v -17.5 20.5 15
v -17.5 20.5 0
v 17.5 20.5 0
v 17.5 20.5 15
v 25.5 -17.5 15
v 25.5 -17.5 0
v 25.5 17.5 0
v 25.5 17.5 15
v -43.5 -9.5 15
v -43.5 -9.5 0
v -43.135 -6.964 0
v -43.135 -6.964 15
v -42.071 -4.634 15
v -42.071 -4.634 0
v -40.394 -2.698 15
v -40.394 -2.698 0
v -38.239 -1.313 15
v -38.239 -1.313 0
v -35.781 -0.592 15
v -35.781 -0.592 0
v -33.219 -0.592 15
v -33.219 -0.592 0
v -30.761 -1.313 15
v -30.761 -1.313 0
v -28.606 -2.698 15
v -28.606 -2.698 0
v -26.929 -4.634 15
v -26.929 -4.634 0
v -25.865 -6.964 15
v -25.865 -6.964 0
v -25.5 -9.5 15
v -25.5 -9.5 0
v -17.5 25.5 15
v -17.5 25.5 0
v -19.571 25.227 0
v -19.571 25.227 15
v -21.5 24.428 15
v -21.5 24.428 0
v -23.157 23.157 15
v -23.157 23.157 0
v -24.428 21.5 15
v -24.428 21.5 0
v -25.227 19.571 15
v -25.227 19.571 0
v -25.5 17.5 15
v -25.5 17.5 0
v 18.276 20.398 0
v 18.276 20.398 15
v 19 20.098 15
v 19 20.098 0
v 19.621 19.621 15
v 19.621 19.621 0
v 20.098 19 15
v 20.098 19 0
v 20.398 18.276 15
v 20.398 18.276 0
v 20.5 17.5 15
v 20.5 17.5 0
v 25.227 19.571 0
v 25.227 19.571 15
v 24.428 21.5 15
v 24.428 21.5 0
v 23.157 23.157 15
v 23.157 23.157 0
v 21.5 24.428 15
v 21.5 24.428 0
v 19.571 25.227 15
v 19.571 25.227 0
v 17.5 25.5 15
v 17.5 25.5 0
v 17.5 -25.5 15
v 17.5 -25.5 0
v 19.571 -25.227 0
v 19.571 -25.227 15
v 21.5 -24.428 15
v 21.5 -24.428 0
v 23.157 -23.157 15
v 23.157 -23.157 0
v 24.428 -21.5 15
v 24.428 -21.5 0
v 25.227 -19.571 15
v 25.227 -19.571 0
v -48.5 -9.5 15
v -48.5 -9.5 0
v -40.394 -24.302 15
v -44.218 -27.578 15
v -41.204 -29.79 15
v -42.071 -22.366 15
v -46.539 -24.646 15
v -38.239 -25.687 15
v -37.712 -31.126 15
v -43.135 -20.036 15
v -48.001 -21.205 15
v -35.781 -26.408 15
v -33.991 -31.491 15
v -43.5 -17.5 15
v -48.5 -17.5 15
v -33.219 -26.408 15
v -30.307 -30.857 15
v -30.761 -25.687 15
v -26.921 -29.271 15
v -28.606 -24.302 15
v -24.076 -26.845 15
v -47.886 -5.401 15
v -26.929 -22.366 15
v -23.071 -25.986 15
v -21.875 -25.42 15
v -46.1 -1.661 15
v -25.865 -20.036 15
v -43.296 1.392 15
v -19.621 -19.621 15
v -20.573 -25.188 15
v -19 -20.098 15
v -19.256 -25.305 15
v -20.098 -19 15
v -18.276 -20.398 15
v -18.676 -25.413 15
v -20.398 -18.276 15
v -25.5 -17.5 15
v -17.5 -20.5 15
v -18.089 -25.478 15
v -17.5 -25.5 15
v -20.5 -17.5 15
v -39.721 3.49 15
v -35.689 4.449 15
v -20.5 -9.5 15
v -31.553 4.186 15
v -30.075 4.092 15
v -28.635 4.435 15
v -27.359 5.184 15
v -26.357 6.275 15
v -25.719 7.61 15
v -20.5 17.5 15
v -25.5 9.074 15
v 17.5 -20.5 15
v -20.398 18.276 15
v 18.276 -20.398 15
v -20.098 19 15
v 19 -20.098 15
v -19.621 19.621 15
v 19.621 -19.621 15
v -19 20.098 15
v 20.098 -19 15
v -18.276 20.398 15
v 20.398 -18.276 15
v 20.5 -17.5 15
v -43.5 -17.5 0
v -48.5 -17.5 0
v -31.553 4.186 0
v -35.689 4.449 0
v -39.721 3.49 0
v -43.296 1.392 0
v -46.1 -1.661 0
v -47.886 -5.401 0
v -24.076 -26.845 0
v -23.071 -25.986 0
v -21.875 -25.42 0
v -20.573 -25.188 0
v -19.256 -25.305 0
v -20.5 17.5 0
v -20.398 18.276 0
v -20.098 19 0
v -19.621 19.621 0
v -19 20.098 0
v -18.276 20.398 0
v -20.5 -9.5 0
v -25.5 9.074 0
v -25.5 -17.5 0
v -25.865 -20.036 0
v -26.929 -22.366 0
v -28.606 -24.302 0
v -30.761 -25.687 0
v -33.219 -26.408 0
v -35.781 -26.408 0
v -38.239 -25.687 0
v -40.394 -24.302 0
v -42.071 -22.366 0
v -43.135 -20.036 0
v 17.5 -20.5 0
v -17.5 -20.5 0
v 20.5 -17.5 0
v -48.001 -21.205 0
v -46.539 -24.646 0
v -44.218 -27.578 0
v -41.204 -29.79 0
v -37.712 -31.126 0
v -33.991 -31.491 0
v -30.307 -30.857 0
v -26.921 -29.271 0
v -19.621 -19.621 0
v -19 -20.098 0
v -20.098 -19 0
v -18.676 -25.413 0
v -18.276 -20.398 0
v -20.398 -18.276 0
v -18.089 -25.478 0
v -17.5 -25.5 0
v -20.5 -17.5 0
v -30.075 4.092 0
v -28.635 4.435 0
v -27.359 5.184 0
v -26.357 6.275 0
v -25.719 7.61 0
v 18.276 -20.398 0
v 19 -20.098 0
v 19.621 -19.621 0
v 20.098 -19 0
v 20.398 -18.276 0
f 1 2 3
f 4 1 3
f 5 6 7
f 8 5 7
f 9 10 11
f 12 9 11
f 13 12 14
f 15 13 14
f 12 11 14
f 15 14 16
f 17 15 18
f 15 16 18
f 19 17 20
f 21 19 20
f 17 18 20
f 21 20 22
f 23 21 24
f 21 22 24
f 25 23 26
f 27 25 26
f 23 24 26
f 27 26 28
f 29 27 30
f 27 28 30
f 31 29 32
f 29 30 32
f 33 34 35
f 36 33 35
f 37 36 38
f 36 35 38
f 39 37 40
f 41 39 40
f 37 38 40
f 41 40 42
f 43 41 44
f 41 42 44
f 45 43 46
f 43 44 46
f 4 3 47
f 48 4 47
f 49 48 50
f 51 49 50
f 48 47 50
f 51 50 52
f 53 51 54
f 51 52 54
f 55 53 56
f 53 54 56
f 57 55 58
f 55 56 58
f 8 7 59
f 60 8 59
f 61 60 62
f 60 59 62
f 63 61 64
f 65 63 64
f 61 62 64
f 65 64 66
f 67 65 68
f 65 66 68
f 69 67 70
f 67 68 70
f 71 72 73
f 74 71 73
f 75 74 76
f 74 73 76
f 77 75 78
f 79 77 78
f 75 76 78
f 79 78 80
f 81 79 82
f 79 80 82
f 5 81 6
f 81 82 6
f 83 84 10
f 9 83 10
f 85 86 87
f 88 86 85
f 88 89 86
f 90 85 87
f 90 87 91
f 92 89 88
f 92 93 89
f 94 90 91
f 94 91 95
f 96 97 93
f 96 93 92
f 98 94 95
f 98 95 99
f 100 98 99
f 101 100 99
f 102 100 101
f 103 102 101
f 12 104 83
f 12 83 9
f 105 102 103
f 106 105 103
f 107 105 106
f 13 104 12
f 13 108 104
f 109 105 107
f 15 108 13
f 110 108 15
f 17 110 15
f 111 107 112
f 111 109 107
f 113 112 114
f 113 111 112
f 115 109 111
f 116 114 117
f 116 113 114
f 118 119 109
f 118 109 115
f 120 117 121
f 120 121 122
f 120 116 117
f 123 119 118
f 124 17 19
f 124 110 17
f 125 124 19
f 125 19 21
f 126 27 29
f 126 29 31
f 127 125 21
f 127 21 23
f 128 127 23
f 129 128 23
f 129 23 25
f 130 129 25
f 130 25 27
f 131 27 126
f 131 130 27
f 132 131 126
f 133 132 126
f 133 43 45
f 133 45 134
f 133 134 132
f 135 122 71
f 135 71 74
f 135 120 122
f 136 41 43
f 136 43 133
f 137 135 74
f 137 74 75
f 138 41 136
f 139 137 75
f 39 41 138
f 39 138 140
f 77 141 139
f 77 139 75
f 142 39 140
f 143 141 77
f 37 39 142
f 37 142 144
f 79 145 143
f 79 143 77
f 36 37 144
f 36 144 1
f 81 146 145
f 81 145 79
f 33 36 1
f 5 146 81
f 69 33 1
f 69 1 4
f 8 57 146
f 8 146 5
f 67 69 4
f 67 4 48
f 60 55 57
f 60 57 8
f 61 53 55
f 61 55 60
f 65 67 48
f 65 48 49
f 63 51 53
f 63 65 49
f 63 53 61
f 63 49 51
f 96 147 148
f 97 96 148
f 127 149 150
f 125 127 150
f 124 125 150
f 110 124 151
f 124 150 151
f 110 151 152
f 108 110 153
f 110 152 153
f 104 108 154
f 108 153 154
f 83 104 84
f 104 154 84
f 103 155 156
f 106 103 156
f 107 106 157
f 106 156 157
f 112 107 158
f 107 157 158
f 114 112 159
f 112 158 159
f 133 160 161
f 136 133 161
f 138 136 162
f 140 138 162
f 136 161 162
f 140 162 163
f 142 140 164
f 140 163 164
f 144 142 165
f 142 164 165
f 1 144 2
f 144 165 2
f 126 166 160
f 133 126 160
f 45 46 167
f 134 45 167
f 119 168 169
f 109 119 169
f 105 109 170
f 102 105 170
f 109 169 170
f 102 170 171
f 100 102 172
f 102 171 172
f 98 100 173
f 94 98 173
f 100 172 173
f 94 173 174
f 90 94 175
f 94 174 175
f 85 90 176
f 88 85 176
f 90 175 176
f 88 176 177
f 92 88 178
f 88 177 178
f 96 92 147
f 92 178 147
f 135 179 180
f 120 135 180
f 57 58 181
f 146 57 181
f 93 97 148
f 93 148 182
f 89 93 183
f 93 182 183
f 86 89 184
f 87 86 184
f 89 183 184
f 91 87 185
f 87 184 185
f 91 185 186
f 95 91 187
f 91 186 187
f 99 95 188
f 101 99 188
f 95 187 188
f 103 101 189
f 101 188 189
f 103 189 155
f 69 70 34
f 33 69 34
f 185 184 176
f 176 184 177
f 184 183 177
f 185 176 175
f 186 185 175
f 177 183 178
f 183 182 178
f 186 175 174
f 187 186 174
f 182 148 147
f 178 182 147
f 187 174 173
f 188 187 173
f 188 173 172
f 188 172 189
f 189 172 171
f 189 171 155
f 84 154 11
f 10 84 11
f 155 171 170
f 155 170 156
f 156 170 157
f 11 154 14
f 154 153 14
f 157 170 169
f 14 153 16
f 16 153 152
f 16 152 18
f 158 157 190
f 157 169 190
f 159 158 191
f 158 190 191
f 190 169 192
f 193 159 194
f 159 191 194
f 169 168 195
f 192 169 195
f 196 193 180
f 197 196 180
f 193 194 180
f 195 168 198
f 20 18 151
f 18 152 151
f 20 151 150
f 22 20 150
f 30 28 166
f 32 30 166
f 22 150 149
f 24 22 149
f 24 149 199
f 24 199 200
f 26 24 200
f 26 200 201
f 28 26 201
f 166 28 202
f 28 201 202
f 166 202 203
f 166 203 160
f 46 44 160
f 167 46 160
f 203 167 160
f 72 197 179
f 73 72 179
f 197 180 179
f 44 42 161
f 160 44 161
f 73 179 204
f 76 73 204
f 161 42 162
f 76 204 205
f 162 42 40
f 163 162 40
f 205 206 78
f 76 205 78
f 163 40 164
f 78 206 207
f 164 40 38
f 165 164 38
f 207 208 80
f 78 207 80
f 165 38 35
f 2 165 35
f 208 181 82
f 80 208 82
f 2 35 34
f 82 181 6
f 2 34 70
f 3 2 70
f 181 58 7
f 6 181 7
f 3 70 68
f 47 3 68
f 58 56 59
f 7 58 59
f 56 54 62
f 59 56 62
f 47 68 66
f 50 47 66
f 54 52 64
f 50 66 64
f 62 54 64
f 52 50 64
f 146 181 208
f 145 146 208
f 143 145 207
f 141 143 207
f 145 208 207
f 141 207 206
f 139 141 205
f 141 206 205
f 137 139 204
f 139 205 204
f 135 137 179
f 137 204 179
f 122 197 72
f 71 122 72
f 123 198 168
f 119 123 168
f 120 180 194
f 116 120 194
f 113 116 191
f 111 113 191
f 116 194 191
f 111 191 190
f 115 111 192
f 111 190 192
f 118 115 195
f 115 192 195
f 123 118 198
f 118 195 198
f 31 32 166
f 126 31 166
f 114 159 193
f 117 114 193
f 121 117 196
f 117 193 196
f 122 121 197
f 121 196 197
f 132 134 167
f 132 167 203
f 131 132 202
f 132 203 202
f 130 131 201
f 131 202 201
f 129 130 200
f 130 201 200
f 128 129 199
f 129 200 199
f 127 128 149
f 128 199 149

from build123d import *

# Parameters (mm, degrees)
F1_DEPTH = 15


with BuildPart() as f1:
    # F0 (on Top) → F1 (new body)
    with BuildSketch(Plane.XY):
        with BuildLine():
            ThreePointArc((20.5, -17.5), (19.62132, -19.62132), (17.5, -20.5))
            Line((17.5, -20.5), (-17.5, -20.5))
            ThreePointArc((-17.5, -20.5), (-19.62132, -19.62132), (-20.5, -17.5))
            Line((-20.5, -17.5), (-25.5, -17.5))
            ThreePointArc((-25.5, -17.5), (-34.5, -26.5), (-43.5, -17.5))
            Line((-43.5, -17.5), (-48.5, -17.5))
            ThreePointArc((-48.5, -17.5), (-39.503095, -30.575513), (-24.075852, -26.845433))
            ThreePointArc((-24.075852, -26.845433), (-21.875021, -25.420392), (-19.255656, -25.304977))
            ThreePointArc((-19.255656, -25.304977), (-18.383227, -25.451095), (-17.5, -25.5))
            Line((-17.5, -25.5), (17.5, -25.5))
            ThreePointArc((17.5, -25.5), (23.156854, -23.156854), (25.5, -17.5))
            Line((25.5, -17.5), (25.5, 17.5))
            ThreePointArc((25.5, 17.5), (23.156854, 23.156854), (17.5, 25.5))
            Line((17.5, 25.5), (-17.5, 25.5))
            ThreePointArc((-17.5, 25.5), (-23.156854, 23.156854), (-25.5, 17.5))
            Line((-25.5, 17.5), (-25.5, 9.074176))
            ThreePointArc((-25.5, 9.074176), (-27.358596, 5.184242), (-31.552632, 4.186235))
            ThreePointArc((-31.552632, 4.186235), (-43.295932, 1.391812), (-48.5, -9.5))
            Line((-48.5, -9.5), (-43.5, -9.5))
            ThreePointArc((-43.5, -9.5), (-34.5, -0.5), (-25.5, -9.5))
            Line((-25.5, -9.5), (-20.5, -9.5))
            Line((-20.5, -9.5), (-20.5, 17.5))
            ThreePointArc((-20.5, 17.5), (-19.62132, 19.62132), (-17.5, 20.5))
            Line((-17.5, 20.5), (17.5, 20.5))
            ThreePointArc((17.5, 20.5), (19.62132, 19.62132), (20.5, 17.5))
            Line((20.5, 17.5), (20.5, -17.5))
        make_face()
    extrude(amount=F1_DEPTH)


solid = f1.part
